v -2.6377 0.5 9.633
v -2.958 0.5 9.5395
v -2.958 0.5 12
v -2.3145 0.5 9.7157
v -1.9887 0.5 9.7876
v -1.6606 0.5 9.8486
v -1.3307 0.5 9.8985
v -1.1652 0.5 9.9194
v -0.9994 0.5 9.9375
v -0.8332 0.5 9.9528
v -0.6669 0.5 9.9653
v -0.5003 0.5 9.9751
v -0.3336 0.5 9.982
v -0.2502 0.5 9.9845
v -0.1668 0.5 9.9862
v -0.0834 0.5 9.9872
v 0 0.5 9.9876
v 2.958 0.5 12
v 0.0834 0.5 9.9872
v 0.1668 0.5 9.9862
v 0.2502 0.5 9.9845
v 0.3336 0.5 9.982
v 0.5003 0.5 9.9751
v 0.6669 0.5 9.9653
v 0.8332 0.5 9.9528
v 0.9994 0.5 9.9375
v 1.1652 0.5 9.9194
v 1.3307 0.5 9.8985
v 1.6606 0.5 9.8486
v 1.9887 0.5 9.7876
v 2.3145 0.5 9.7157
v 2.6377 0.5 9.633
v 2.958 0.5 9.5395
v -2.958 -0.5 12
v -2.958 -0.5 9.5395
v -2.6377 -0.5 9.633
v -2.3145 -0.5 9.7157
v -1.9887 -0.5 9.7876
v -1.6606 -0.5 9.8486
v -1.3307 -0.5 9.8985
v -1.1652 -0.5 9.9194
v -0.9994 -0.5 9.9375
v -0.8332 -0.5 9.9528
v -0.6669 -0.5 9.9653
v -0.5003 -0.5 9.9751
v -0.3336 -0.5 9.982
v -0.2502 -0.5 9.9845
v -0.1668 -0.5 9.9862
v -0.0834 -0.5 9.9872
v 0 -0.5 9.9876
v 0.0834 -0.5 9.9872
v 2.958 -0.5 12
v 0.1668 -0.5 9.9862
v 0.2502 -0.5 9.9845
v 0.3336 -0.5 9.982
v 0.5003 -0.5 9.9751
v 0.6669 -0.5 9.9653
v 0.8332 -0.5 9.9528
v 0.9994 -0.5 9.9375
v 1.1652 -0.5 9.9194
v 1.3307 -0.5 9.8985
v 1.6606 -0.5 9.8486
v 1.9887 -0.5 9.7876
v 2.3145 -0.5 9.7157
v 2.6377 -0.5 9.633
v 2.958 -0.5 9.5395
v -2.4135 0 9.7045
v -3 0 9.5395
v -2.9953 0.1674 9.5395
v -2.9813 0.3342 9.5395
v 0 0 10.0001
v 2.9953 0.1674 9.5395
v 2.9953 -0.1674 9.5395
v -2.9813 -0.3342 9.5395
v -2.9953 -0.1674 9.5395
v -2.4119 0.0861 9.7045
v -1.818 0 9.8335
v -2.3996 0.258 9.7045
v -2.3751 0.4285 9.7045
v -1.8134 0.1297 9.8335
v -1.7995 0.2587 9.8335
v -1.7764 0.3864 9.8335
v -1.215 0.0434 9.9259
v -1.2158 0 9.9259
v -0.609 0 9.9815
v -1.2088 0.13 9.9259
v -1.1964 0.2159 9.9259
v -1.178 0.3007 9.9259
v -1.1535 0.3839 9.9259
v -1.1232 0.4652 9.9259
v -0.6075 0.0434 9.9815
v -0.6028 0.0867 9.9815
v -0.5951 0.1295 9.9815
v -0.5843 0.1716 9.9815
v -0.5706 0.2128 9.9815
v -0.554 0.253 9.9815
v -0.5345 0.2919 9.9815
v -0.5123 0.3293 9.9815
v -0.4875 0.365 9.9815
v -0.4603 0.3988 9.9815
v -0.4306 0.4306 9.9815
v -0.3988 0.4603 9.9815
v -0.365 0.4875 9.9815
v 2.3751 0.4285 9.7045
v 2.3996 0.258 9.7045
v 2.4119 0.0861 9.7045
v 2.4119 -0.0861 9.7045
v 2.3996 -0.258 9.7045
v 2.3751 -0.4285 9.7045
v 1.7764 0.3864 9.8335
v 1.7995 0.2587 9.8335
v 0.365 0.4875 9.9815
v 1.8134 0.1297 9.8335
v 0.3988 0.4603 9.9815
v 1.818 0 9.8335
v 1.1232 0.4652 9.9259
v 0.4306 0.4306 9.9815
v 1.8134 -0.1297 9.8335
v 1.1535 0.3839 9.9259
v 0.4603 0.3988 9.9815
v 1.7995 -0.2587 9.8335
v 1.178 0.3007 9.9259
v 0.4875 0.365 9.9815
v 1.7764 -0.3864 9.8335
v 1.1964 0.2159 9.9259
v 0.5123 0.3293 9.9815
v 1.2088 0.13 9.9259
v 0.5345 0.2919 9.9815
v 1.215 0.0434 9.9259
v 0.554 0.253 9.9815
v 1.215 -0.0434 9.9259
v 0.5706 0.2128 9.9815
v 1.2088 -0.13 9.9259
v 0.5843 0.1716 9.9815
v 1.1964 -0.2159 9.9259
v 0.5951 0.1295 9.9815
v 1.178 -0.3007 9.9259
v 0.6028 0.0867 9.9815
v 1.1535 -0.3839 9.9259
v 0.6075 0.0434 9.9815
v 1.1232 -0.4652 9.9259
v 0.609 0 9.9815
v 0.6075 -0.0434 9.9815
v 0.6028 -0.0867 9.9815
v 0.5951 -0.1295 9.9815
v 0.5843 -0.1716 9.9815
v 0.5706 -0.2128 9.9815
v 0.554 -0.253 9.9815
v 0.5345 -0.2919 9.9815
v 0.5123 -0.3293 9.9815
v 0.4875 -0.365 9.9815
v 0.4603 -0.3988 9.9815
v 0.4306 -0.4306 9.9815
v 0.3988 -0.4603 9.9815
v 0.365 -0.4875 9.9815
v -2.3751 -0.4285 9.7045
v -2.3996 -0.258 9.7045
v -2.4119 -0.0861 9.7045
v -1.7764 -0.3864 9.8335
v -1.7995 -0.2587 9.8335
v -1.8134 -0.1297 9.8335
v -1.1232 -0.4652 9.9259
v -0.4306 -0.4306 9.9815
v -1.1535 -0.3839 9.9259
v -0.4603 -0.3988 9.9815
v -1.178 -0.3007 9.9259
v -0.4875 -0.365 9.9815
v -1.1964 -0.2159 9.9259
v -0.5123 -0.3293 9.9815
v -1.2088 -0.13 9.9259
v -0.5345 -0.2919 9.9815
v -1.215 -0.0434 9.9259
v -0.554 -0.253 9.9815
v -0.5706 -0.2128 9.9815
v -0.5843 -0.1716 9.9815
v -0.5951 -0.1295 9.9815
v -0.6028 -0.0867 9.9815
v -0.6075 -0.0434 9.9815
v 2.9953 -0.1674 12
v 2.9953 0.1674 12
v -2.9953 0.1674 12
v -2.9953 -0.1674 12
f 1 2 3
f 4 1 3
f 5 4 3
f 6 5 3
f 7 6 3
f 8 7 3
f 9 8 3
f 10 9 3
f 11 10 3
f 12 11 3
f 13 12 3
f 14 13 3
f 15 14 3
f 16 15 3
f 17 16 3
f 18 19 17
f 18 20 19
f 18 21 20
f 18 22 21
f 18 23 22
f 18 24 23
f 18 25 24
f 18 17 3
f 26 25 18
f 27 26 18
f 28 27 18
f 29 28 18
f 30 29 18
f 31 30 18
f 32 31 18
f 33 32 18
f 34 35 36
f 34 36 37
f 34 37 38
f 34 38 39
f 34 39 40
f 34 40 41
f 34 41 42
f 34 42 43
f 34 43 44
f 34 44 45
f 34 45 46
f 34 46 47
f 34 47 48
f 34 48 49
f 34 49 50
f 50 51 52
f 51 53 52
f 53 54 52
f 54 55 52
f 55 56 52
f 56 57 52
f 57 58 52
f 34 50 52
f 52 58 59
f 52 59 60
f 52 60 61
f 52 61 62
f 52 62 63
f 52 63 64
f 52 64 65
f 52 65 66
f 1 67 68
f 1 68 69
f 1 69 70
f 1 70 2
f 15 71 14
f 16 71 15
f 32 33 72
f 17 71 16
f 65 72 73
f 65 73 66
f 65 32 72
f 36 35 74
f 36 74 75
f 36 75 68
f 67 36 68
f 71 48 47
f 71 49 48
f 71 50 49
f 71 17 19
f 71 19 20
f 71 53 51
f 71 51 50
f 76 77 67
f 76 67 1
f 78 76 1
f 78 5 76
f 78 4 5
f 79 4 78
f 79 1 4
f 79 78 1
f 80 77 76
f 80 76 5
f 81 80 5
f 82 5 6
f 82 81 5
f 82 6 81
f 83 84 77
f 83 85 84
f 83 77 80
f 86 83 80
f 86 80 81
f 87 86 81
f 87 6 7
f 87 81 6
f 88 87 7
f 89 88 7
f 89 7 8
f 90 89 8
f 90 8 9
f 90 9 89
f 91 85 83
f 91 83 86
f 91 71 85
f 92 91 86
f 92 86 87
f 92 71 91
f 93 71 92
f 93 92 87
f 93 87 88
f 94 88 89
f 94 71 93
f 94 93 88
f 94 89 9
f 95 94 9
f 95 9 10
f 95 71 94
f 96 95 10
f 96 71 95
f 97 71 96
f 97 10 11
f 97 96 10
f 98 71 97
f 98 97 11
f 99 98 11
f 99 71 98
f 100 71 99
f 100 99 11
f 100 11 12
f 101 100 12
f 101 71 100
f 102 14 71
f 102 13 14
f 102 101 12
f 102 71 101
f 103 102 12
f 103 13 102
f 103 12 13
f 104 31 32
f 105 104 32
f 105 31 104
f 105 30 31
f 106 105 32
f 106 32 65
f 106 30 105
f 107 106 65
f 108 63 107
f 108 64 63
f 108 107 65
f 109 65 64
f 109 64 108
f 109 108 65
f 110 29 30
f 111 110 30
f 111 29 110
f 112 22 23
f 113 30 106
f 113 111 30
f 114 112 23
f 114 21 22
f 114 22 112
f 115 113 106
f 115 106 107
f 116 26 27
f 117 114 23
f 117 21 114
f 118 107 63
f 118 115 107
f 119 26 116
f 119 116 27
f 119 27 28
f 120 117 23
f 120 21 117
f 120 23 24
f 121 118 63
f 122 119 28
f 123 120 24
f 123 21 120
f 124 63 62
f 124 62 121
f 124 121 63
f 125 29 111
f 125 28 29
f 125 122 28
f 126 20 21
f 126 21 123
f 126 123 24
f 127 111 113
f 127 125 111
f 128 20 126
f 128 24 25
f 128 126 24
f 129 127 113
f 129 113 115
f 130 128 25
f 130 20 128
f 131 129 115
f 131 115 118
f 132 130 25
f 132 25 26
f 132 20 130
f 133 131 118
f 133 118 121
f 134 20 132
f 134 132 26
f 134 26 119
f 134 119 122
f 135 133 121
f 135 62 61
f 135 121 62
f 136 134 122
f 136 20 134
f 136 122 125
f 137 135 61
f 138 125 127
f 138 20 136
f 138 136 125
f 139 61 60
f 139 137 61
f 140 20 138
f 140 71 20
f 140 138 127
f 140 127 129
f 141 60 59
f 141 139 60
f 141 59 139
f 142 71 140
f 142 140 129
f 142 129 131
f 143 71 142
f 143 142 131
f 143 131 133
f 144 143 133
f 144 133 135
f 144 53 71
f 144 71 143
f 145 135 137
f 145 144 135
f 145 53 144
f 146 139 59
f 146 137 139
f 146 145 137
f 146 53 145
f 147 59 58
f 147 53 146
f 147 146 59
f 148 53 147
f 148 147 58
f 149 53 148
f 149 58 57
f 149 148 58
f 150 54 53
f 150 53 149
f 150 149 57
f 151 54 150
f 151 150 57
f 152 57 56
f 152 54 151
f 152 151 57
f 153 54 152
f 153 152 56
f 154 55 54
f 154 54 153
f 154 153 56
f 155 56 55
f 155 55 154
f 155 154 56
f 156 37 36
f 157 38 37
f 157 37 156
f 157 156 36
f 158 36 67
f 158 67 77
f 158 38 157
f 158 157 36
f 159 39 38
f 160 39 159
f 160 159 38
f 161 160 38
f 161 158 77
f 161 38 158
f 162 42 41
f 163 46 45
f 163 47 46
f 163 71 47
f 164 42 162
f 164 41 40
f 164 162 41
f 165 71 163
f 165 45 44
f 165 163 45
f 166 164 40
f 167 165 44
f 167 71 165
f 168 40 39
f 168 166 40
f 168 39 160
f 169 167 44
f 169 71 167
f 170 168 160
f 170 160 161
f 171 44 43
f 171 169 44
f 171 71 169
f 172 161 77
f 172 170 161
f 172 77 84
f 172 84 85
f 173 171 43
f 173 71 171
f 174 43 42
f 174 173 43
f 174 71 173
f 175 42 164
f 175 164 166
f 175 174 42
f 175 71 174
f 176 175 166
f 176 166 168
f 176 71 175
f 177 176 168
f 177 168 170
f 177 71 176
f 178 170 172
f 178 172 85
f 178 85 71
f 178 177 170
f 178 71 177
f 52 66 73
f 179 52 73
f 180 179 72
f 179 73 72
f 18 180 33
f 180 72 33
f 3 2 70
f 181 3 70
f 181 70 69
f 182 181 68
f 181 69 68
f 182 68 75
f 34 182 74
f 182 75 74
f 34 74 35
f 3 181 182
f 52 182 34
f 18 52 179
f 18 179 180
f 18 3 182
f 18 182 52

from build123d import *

# Parameters (mm, degrees)
SKETCH1_R               = 3
BOSS_EXTRUDE1_DEPTH     = 12
CUT_EXTRUDE1_DEPTH      = 30
CUT_EXTRUDE1_DEPTH_BACK = 20
SKETCH4_OUTSIDE_W       = 9.766
SKETCH4_OUTSIDE_H       = 9.766
SKETCH4_OUTSIDE_W_2     = 17.421605186
SKETCH4_OUTSIDE_H_2     = 1


with BuildPart() as part:
    # Sketch1 → Boss-Extrude1 (new body)
    with BuildSketch(Plane.XY):
        Circle(SKETCH1_R)
    extrude(amount=BOSS_EXTRUDE1_DEPTH)

    # Sketch3 → Cut-Revolve1 (revolve, cut)
    with BuildSketch(Plane(origin=(0, 0, 0), x_dir=(1, 0, 0), z_dir=(0, 1, 0))):
        with BuildLine():
            Line((0, -10.0001), (0, 10.0001))
            ThreePointArc((0, 10.0001), (-10.0001, 0), (0, -10.0001))
        make_face()
    revolve(axis=Axis((0, 0, 10.0001), (0, 0, -1)), mode=Mode.SUBTRACT)

    # Sketch4 outside → Cut-Extrude1 (cut, two sides: drawn at the far end of the back side and taken through both)
    with BuildSketch(Plane.XY.offset(-CUT_EXTRUDE1_DEPTH_BACK)):
        Rectangle(SKETCH4_OUTSIDE_W, SKETCH4_OUTSIDE_H)
        Rectangle(SKETCH4_OUTSIDE_W_2, SKETCH4_OUTSIDE_H_2, mode=Mode.SUBTRACT)
    extrude(amount=CUT_EXTRUDE1_DEPTH + CUT_EXTRUDE1_DEPTH_BACK, mode=Mode.SUBTRACT)


solid = part.part
